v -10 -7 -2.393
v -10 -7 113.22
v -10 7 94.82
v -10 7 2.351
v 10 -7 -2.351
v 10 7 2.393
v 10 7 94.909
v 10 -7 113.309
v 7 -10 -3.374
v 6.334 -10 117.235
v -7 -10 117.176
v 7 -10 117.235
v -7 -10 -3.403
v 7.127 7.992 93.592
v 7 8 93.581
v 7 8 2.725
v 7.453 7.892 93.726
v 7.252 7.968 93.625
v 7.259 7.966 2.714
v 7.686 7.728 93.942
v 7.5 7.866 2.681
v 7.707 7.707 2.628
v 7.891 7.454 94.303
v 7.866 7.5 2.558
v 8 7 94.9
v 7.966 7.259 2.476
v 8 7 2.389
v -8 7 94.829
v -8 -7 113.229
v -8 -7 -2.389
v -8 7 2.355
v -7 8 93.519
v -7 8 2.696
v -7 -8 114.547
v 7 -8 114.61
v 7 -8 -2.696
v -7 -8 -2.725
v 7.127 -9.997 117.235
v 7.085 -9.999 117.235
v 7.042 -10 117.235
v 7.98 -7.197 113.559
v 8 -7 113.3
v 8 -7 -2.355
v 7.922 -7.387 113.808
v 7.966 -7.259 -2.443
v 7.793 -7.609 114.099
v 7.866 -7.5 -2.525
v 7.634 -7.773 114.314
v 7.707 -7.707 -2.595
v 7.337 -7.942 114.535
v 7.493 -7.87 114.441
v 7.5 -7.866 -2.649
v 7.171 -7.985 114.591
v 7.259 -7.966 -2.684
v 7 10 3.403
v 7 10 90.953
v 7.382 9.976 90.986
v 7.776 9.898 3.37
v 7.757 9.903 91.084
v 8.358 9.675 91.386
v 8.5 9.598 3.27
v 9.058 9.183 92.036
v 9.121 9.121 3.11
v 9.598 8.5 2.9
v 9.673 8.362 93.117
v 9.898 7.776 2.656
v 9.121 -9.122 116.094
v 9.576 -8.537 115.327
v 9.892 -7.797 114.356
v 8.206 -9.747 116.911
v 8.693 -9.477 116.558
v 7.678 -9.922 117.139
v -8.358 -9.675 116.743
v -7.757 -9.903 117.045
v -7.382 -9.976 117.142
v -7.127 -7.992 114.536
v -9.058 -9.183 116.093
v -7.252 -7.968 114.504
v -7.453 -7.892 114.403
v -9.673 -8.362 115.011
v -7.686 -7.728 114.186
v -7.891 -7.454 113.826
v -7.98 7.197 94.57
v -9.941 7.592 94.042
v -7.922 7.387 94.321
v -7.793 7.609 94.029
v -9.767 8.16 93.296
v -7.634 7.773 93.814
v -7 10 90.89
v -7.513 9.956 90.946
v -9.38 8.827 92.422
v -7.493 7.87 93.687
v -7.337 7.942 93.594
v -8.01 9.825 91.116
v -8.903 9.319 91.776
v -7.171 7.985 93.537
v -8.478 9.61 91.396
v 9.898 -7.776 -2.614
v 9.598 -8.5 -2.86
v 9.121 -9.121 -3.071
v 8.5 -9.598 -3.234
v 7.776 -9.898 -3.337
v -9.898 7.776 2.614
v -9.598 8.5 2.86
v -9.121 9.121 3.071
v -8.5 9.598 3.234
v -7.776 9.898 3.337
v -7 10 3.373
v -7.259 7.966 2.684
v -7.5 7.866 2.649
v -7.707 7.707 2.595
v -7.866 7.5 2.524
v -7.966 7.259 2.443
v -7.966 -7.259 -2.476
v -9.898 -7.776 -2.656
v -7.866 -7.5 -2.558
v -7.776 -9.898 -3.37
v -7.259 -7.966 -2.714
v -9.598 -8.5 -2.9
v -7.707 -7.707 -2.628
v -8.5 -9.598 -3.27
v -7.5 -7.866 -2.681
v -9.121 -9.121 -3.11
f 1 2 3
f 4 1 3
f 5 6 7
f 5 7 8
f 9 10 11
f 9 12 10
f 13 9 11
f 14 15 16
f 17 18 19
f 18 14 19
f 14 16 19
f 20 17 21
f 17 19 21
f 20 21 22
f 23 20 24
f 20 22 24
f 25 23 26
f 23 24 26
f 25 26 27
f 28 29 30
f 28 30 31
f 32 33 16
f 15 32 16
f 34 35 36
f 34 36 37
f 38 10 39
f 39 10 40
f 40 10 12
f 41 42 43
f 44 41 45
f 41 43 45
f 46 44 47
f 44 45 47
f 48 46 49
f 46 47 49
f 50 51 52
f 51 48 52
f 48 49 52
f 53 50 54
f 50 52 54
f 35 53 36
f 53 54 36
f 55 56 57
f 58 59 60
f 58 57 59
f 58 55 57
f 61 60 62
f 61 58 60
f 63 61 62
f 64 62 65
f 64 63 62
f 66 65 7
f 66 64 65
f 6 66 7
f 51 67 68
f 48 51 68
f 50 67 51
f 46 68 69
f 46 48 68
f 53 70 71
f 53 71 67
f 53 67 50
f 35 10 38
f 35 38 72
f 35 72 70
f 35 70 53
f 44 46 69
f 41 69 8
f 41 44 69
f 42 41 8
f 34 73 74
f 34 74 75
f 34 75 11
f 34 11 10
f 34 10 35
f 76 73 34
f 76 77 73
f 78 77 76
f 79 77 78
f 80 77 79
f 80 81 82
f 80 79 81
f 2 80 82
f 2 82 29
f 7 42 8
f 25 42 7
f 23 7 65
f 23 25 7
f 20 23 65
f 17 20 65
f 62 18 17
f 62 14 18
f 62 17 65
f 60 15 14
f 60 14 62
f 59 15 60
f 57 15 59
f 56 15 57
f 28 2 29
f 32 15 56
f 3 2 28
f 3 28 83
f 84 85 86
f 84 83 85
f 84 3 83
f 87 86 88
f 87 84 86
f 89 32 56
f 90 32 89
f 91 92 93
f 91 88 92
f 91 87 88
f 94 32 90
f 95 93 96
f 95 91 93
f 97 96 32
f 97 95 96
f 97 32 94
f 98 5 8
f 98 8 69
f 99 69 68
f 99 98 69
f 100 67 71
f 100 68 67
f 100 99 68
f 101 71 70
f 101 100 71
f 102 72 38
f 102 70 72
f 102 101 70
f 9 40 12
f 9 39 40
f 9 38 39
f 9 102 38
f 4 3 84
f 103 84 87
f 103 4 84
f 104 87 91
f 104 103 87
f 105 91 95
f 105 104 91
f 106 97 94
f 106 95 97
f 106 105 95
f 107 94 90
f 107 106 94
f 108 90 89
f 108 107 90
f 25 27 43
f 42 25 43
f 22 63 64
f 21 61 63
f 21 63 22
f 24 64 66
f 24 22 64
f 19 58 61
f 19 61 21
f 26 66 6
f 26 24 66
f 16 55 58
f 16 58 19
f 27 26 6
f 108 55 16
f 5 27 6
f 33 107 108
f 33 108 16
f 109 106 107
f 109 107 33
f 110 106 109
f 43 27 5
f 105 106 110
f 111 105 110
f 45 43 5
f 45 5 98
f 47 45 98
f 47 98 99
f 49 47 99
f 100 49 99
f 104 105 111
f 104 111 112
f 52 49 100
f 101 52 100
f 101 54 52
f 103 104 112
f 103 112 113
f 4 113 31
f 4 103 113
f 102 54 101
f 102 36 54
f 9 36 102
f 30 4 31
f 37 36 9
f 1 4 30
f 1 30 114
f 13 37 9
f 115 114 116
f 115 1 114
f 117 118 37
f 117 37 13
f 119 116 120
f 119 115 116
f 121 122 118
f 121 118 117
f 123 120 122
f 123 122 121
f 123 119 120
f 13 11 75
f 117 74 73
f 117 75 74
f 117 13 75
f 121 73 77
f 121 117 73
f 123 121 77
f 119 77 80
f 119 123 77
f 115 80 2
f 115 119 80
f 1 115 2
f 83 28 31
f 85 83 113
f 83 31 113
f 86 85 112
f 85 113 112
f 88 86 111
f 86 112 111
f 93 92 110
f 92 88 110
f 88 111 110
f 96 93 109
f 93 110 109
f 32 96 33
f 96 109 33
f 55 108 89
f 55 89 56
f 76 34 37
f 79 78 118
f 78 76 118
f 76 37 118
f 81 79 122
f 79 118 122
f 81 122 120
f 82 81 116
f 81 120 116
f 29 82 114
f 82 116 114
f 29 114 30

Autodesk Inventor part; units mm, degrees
ref_plane "Start Plane" through (0, 0, -3.4097) normal (0, 0, 1) x (1, 0, 0)
ref_plane "End Plane" through (0, 0, 117.2353) normal (0, 0, 1) x (1, 0, 0)
sketch "Sketch" plane through (0, 0, 0) normal (0, 0, 1) x (1, 0, 0)
  line L0 (-10, -7) -> (-10, 7)
  line L1 (-7, 10) -> (7, 10)
  line L2 (10, 7) -> (10, -7)
  line L3 (7, -10) -> (-7, -10)
  arc A0 (-10, -7) -> (-7, -10) centre (-7, -7) ccw
  arc A1 (-7, 10) -> (-10, 7) centre (-7, 7) ccw
  arc A2 (10, 7) -> (7, 10) centre (7, 7) ccw
  arc A3 (7, -10) -> (10, -7) centre (7, -7) ccw
  arc A4 (-7, 8) -> (-8, 7) centre (-7, 7) ccw
  line L4 (-7, 8) -> (7, 8)
  arc A5 (8, 7) -> (7, 8) centre (7, 7) ccw
  line L5 (8, 7) -> (8, -7)
  arc A6 (7, -8) -> (8, -7) centre (7, -7) ccw
  line L6 (7, -8) -> (-7, -8)
  arc A7 (-8, -7) -> (-7, -8) centre (-7, -7) ccw
  line L7 (-8, -7) -> (-8, 7)
  line L8 (0, 14.8698) -> (0, -14.8698) construction
  line L9 (-14.8698, 0) -> (14.8698, 0) construction
  dimension "d7" = 3
  dimension "d10" = 20
  dimension "d11" = 20
  dimension "d12" = 2
  dimension "d15" = 10
  dimension "d16" = 10
extrude "Body" add sketch "Sketch" along normal up to surface (120.6451 mm away) from surface at -3.4097
sketch "Sketch3" plane through (0, 0, 0) normal (0, 0, 1) x (1, 0, 0)
  line L0 (0, 0) -> (10, 0)
ref_plane "Work Plane3" through (0, 0, 0) normal (0, -1, 0) x (1, 0, 0)
sketch "Sketch4" plane through (0, 0, 0) normal (0, -1, 0) x (1, 0, 0)
  line L0 (-2, -3.4097) -> (12, -3.4097)
  line L1 (-2, 117.2353) -> (12, 117.2353)
  dimension "d18" = 120.645
ref_plane "Work Plane4" through (-0.0634, -10.0438, -3.4033) normal (0.002, 0.3209, -0.9471) x (0.9999, -0.0123, -0.002)
split "Split1" plane through (-0.0634, -10.0438, -3.4033) removes the side toward (0.002, 0.3209, -0.9471)
ref_plane "Work Plane5" through (219.4811, -4.3152, 110.7144) normal (-0.0027, 0.7958, 0.6055) x (1, 0.0014, 0.0027)
split "Split2" plane through (219.4811, -4.3152, 110.7144) removes the side toward (-0.0027, 0.7958, 0.6055)
ref_plane "Work Plane7" through (0.108, -1.8289, -14.111) normal (-0.0027, 0.7958, 0.6055) x (-1, -0.0023, -0.0016)
sketch "Sketch6" plane through (0.108, -1.8289, -14.111) normal (-0.0027, 0.7958, 0.6055) x (-1, -0.0023, -0.0016)
  circle A0 centre (-0.1219, -14.9734) radius 2.25 projected
  circle A1 centre (-0.1219, -14.9734) radius 4
  point P0 (0.0818, 10.1227)
  dimension "d22" = 8
extrude "Extrusion2" [suppressed]
equation "\"d7\" = G_IR"
equation "\"d10\" = G_H"
equation "\"d11\" = G_W"
equation "\"d12\" = G_T"
equation "\"d15\" = 0.5 * d10"
equation "\"d16\" = 0.5 * d11"
equation "\"d3\" = G_L"
equation "\"G_W\" = 20"
equation "\"G_H\" = 20"
equation "\"G_T\" = 2"
equation "\"G_IR\" = 3"
equation "\"G_L\" = d18"
equation "\"G_OFFSET_START\" = 3.40974"
equation "\"G_OFFSET_END\" = 13.16879"
equation "\"d13\" = -G_OFFSET_START"
equation "\"d14\" = G_OFFSET_END + B_L"
equation "\"B_L\" = 104.06651"
properties part number "ISO 12633-2 - 20x20x2 - 120.65" material "Steel, Mild"
